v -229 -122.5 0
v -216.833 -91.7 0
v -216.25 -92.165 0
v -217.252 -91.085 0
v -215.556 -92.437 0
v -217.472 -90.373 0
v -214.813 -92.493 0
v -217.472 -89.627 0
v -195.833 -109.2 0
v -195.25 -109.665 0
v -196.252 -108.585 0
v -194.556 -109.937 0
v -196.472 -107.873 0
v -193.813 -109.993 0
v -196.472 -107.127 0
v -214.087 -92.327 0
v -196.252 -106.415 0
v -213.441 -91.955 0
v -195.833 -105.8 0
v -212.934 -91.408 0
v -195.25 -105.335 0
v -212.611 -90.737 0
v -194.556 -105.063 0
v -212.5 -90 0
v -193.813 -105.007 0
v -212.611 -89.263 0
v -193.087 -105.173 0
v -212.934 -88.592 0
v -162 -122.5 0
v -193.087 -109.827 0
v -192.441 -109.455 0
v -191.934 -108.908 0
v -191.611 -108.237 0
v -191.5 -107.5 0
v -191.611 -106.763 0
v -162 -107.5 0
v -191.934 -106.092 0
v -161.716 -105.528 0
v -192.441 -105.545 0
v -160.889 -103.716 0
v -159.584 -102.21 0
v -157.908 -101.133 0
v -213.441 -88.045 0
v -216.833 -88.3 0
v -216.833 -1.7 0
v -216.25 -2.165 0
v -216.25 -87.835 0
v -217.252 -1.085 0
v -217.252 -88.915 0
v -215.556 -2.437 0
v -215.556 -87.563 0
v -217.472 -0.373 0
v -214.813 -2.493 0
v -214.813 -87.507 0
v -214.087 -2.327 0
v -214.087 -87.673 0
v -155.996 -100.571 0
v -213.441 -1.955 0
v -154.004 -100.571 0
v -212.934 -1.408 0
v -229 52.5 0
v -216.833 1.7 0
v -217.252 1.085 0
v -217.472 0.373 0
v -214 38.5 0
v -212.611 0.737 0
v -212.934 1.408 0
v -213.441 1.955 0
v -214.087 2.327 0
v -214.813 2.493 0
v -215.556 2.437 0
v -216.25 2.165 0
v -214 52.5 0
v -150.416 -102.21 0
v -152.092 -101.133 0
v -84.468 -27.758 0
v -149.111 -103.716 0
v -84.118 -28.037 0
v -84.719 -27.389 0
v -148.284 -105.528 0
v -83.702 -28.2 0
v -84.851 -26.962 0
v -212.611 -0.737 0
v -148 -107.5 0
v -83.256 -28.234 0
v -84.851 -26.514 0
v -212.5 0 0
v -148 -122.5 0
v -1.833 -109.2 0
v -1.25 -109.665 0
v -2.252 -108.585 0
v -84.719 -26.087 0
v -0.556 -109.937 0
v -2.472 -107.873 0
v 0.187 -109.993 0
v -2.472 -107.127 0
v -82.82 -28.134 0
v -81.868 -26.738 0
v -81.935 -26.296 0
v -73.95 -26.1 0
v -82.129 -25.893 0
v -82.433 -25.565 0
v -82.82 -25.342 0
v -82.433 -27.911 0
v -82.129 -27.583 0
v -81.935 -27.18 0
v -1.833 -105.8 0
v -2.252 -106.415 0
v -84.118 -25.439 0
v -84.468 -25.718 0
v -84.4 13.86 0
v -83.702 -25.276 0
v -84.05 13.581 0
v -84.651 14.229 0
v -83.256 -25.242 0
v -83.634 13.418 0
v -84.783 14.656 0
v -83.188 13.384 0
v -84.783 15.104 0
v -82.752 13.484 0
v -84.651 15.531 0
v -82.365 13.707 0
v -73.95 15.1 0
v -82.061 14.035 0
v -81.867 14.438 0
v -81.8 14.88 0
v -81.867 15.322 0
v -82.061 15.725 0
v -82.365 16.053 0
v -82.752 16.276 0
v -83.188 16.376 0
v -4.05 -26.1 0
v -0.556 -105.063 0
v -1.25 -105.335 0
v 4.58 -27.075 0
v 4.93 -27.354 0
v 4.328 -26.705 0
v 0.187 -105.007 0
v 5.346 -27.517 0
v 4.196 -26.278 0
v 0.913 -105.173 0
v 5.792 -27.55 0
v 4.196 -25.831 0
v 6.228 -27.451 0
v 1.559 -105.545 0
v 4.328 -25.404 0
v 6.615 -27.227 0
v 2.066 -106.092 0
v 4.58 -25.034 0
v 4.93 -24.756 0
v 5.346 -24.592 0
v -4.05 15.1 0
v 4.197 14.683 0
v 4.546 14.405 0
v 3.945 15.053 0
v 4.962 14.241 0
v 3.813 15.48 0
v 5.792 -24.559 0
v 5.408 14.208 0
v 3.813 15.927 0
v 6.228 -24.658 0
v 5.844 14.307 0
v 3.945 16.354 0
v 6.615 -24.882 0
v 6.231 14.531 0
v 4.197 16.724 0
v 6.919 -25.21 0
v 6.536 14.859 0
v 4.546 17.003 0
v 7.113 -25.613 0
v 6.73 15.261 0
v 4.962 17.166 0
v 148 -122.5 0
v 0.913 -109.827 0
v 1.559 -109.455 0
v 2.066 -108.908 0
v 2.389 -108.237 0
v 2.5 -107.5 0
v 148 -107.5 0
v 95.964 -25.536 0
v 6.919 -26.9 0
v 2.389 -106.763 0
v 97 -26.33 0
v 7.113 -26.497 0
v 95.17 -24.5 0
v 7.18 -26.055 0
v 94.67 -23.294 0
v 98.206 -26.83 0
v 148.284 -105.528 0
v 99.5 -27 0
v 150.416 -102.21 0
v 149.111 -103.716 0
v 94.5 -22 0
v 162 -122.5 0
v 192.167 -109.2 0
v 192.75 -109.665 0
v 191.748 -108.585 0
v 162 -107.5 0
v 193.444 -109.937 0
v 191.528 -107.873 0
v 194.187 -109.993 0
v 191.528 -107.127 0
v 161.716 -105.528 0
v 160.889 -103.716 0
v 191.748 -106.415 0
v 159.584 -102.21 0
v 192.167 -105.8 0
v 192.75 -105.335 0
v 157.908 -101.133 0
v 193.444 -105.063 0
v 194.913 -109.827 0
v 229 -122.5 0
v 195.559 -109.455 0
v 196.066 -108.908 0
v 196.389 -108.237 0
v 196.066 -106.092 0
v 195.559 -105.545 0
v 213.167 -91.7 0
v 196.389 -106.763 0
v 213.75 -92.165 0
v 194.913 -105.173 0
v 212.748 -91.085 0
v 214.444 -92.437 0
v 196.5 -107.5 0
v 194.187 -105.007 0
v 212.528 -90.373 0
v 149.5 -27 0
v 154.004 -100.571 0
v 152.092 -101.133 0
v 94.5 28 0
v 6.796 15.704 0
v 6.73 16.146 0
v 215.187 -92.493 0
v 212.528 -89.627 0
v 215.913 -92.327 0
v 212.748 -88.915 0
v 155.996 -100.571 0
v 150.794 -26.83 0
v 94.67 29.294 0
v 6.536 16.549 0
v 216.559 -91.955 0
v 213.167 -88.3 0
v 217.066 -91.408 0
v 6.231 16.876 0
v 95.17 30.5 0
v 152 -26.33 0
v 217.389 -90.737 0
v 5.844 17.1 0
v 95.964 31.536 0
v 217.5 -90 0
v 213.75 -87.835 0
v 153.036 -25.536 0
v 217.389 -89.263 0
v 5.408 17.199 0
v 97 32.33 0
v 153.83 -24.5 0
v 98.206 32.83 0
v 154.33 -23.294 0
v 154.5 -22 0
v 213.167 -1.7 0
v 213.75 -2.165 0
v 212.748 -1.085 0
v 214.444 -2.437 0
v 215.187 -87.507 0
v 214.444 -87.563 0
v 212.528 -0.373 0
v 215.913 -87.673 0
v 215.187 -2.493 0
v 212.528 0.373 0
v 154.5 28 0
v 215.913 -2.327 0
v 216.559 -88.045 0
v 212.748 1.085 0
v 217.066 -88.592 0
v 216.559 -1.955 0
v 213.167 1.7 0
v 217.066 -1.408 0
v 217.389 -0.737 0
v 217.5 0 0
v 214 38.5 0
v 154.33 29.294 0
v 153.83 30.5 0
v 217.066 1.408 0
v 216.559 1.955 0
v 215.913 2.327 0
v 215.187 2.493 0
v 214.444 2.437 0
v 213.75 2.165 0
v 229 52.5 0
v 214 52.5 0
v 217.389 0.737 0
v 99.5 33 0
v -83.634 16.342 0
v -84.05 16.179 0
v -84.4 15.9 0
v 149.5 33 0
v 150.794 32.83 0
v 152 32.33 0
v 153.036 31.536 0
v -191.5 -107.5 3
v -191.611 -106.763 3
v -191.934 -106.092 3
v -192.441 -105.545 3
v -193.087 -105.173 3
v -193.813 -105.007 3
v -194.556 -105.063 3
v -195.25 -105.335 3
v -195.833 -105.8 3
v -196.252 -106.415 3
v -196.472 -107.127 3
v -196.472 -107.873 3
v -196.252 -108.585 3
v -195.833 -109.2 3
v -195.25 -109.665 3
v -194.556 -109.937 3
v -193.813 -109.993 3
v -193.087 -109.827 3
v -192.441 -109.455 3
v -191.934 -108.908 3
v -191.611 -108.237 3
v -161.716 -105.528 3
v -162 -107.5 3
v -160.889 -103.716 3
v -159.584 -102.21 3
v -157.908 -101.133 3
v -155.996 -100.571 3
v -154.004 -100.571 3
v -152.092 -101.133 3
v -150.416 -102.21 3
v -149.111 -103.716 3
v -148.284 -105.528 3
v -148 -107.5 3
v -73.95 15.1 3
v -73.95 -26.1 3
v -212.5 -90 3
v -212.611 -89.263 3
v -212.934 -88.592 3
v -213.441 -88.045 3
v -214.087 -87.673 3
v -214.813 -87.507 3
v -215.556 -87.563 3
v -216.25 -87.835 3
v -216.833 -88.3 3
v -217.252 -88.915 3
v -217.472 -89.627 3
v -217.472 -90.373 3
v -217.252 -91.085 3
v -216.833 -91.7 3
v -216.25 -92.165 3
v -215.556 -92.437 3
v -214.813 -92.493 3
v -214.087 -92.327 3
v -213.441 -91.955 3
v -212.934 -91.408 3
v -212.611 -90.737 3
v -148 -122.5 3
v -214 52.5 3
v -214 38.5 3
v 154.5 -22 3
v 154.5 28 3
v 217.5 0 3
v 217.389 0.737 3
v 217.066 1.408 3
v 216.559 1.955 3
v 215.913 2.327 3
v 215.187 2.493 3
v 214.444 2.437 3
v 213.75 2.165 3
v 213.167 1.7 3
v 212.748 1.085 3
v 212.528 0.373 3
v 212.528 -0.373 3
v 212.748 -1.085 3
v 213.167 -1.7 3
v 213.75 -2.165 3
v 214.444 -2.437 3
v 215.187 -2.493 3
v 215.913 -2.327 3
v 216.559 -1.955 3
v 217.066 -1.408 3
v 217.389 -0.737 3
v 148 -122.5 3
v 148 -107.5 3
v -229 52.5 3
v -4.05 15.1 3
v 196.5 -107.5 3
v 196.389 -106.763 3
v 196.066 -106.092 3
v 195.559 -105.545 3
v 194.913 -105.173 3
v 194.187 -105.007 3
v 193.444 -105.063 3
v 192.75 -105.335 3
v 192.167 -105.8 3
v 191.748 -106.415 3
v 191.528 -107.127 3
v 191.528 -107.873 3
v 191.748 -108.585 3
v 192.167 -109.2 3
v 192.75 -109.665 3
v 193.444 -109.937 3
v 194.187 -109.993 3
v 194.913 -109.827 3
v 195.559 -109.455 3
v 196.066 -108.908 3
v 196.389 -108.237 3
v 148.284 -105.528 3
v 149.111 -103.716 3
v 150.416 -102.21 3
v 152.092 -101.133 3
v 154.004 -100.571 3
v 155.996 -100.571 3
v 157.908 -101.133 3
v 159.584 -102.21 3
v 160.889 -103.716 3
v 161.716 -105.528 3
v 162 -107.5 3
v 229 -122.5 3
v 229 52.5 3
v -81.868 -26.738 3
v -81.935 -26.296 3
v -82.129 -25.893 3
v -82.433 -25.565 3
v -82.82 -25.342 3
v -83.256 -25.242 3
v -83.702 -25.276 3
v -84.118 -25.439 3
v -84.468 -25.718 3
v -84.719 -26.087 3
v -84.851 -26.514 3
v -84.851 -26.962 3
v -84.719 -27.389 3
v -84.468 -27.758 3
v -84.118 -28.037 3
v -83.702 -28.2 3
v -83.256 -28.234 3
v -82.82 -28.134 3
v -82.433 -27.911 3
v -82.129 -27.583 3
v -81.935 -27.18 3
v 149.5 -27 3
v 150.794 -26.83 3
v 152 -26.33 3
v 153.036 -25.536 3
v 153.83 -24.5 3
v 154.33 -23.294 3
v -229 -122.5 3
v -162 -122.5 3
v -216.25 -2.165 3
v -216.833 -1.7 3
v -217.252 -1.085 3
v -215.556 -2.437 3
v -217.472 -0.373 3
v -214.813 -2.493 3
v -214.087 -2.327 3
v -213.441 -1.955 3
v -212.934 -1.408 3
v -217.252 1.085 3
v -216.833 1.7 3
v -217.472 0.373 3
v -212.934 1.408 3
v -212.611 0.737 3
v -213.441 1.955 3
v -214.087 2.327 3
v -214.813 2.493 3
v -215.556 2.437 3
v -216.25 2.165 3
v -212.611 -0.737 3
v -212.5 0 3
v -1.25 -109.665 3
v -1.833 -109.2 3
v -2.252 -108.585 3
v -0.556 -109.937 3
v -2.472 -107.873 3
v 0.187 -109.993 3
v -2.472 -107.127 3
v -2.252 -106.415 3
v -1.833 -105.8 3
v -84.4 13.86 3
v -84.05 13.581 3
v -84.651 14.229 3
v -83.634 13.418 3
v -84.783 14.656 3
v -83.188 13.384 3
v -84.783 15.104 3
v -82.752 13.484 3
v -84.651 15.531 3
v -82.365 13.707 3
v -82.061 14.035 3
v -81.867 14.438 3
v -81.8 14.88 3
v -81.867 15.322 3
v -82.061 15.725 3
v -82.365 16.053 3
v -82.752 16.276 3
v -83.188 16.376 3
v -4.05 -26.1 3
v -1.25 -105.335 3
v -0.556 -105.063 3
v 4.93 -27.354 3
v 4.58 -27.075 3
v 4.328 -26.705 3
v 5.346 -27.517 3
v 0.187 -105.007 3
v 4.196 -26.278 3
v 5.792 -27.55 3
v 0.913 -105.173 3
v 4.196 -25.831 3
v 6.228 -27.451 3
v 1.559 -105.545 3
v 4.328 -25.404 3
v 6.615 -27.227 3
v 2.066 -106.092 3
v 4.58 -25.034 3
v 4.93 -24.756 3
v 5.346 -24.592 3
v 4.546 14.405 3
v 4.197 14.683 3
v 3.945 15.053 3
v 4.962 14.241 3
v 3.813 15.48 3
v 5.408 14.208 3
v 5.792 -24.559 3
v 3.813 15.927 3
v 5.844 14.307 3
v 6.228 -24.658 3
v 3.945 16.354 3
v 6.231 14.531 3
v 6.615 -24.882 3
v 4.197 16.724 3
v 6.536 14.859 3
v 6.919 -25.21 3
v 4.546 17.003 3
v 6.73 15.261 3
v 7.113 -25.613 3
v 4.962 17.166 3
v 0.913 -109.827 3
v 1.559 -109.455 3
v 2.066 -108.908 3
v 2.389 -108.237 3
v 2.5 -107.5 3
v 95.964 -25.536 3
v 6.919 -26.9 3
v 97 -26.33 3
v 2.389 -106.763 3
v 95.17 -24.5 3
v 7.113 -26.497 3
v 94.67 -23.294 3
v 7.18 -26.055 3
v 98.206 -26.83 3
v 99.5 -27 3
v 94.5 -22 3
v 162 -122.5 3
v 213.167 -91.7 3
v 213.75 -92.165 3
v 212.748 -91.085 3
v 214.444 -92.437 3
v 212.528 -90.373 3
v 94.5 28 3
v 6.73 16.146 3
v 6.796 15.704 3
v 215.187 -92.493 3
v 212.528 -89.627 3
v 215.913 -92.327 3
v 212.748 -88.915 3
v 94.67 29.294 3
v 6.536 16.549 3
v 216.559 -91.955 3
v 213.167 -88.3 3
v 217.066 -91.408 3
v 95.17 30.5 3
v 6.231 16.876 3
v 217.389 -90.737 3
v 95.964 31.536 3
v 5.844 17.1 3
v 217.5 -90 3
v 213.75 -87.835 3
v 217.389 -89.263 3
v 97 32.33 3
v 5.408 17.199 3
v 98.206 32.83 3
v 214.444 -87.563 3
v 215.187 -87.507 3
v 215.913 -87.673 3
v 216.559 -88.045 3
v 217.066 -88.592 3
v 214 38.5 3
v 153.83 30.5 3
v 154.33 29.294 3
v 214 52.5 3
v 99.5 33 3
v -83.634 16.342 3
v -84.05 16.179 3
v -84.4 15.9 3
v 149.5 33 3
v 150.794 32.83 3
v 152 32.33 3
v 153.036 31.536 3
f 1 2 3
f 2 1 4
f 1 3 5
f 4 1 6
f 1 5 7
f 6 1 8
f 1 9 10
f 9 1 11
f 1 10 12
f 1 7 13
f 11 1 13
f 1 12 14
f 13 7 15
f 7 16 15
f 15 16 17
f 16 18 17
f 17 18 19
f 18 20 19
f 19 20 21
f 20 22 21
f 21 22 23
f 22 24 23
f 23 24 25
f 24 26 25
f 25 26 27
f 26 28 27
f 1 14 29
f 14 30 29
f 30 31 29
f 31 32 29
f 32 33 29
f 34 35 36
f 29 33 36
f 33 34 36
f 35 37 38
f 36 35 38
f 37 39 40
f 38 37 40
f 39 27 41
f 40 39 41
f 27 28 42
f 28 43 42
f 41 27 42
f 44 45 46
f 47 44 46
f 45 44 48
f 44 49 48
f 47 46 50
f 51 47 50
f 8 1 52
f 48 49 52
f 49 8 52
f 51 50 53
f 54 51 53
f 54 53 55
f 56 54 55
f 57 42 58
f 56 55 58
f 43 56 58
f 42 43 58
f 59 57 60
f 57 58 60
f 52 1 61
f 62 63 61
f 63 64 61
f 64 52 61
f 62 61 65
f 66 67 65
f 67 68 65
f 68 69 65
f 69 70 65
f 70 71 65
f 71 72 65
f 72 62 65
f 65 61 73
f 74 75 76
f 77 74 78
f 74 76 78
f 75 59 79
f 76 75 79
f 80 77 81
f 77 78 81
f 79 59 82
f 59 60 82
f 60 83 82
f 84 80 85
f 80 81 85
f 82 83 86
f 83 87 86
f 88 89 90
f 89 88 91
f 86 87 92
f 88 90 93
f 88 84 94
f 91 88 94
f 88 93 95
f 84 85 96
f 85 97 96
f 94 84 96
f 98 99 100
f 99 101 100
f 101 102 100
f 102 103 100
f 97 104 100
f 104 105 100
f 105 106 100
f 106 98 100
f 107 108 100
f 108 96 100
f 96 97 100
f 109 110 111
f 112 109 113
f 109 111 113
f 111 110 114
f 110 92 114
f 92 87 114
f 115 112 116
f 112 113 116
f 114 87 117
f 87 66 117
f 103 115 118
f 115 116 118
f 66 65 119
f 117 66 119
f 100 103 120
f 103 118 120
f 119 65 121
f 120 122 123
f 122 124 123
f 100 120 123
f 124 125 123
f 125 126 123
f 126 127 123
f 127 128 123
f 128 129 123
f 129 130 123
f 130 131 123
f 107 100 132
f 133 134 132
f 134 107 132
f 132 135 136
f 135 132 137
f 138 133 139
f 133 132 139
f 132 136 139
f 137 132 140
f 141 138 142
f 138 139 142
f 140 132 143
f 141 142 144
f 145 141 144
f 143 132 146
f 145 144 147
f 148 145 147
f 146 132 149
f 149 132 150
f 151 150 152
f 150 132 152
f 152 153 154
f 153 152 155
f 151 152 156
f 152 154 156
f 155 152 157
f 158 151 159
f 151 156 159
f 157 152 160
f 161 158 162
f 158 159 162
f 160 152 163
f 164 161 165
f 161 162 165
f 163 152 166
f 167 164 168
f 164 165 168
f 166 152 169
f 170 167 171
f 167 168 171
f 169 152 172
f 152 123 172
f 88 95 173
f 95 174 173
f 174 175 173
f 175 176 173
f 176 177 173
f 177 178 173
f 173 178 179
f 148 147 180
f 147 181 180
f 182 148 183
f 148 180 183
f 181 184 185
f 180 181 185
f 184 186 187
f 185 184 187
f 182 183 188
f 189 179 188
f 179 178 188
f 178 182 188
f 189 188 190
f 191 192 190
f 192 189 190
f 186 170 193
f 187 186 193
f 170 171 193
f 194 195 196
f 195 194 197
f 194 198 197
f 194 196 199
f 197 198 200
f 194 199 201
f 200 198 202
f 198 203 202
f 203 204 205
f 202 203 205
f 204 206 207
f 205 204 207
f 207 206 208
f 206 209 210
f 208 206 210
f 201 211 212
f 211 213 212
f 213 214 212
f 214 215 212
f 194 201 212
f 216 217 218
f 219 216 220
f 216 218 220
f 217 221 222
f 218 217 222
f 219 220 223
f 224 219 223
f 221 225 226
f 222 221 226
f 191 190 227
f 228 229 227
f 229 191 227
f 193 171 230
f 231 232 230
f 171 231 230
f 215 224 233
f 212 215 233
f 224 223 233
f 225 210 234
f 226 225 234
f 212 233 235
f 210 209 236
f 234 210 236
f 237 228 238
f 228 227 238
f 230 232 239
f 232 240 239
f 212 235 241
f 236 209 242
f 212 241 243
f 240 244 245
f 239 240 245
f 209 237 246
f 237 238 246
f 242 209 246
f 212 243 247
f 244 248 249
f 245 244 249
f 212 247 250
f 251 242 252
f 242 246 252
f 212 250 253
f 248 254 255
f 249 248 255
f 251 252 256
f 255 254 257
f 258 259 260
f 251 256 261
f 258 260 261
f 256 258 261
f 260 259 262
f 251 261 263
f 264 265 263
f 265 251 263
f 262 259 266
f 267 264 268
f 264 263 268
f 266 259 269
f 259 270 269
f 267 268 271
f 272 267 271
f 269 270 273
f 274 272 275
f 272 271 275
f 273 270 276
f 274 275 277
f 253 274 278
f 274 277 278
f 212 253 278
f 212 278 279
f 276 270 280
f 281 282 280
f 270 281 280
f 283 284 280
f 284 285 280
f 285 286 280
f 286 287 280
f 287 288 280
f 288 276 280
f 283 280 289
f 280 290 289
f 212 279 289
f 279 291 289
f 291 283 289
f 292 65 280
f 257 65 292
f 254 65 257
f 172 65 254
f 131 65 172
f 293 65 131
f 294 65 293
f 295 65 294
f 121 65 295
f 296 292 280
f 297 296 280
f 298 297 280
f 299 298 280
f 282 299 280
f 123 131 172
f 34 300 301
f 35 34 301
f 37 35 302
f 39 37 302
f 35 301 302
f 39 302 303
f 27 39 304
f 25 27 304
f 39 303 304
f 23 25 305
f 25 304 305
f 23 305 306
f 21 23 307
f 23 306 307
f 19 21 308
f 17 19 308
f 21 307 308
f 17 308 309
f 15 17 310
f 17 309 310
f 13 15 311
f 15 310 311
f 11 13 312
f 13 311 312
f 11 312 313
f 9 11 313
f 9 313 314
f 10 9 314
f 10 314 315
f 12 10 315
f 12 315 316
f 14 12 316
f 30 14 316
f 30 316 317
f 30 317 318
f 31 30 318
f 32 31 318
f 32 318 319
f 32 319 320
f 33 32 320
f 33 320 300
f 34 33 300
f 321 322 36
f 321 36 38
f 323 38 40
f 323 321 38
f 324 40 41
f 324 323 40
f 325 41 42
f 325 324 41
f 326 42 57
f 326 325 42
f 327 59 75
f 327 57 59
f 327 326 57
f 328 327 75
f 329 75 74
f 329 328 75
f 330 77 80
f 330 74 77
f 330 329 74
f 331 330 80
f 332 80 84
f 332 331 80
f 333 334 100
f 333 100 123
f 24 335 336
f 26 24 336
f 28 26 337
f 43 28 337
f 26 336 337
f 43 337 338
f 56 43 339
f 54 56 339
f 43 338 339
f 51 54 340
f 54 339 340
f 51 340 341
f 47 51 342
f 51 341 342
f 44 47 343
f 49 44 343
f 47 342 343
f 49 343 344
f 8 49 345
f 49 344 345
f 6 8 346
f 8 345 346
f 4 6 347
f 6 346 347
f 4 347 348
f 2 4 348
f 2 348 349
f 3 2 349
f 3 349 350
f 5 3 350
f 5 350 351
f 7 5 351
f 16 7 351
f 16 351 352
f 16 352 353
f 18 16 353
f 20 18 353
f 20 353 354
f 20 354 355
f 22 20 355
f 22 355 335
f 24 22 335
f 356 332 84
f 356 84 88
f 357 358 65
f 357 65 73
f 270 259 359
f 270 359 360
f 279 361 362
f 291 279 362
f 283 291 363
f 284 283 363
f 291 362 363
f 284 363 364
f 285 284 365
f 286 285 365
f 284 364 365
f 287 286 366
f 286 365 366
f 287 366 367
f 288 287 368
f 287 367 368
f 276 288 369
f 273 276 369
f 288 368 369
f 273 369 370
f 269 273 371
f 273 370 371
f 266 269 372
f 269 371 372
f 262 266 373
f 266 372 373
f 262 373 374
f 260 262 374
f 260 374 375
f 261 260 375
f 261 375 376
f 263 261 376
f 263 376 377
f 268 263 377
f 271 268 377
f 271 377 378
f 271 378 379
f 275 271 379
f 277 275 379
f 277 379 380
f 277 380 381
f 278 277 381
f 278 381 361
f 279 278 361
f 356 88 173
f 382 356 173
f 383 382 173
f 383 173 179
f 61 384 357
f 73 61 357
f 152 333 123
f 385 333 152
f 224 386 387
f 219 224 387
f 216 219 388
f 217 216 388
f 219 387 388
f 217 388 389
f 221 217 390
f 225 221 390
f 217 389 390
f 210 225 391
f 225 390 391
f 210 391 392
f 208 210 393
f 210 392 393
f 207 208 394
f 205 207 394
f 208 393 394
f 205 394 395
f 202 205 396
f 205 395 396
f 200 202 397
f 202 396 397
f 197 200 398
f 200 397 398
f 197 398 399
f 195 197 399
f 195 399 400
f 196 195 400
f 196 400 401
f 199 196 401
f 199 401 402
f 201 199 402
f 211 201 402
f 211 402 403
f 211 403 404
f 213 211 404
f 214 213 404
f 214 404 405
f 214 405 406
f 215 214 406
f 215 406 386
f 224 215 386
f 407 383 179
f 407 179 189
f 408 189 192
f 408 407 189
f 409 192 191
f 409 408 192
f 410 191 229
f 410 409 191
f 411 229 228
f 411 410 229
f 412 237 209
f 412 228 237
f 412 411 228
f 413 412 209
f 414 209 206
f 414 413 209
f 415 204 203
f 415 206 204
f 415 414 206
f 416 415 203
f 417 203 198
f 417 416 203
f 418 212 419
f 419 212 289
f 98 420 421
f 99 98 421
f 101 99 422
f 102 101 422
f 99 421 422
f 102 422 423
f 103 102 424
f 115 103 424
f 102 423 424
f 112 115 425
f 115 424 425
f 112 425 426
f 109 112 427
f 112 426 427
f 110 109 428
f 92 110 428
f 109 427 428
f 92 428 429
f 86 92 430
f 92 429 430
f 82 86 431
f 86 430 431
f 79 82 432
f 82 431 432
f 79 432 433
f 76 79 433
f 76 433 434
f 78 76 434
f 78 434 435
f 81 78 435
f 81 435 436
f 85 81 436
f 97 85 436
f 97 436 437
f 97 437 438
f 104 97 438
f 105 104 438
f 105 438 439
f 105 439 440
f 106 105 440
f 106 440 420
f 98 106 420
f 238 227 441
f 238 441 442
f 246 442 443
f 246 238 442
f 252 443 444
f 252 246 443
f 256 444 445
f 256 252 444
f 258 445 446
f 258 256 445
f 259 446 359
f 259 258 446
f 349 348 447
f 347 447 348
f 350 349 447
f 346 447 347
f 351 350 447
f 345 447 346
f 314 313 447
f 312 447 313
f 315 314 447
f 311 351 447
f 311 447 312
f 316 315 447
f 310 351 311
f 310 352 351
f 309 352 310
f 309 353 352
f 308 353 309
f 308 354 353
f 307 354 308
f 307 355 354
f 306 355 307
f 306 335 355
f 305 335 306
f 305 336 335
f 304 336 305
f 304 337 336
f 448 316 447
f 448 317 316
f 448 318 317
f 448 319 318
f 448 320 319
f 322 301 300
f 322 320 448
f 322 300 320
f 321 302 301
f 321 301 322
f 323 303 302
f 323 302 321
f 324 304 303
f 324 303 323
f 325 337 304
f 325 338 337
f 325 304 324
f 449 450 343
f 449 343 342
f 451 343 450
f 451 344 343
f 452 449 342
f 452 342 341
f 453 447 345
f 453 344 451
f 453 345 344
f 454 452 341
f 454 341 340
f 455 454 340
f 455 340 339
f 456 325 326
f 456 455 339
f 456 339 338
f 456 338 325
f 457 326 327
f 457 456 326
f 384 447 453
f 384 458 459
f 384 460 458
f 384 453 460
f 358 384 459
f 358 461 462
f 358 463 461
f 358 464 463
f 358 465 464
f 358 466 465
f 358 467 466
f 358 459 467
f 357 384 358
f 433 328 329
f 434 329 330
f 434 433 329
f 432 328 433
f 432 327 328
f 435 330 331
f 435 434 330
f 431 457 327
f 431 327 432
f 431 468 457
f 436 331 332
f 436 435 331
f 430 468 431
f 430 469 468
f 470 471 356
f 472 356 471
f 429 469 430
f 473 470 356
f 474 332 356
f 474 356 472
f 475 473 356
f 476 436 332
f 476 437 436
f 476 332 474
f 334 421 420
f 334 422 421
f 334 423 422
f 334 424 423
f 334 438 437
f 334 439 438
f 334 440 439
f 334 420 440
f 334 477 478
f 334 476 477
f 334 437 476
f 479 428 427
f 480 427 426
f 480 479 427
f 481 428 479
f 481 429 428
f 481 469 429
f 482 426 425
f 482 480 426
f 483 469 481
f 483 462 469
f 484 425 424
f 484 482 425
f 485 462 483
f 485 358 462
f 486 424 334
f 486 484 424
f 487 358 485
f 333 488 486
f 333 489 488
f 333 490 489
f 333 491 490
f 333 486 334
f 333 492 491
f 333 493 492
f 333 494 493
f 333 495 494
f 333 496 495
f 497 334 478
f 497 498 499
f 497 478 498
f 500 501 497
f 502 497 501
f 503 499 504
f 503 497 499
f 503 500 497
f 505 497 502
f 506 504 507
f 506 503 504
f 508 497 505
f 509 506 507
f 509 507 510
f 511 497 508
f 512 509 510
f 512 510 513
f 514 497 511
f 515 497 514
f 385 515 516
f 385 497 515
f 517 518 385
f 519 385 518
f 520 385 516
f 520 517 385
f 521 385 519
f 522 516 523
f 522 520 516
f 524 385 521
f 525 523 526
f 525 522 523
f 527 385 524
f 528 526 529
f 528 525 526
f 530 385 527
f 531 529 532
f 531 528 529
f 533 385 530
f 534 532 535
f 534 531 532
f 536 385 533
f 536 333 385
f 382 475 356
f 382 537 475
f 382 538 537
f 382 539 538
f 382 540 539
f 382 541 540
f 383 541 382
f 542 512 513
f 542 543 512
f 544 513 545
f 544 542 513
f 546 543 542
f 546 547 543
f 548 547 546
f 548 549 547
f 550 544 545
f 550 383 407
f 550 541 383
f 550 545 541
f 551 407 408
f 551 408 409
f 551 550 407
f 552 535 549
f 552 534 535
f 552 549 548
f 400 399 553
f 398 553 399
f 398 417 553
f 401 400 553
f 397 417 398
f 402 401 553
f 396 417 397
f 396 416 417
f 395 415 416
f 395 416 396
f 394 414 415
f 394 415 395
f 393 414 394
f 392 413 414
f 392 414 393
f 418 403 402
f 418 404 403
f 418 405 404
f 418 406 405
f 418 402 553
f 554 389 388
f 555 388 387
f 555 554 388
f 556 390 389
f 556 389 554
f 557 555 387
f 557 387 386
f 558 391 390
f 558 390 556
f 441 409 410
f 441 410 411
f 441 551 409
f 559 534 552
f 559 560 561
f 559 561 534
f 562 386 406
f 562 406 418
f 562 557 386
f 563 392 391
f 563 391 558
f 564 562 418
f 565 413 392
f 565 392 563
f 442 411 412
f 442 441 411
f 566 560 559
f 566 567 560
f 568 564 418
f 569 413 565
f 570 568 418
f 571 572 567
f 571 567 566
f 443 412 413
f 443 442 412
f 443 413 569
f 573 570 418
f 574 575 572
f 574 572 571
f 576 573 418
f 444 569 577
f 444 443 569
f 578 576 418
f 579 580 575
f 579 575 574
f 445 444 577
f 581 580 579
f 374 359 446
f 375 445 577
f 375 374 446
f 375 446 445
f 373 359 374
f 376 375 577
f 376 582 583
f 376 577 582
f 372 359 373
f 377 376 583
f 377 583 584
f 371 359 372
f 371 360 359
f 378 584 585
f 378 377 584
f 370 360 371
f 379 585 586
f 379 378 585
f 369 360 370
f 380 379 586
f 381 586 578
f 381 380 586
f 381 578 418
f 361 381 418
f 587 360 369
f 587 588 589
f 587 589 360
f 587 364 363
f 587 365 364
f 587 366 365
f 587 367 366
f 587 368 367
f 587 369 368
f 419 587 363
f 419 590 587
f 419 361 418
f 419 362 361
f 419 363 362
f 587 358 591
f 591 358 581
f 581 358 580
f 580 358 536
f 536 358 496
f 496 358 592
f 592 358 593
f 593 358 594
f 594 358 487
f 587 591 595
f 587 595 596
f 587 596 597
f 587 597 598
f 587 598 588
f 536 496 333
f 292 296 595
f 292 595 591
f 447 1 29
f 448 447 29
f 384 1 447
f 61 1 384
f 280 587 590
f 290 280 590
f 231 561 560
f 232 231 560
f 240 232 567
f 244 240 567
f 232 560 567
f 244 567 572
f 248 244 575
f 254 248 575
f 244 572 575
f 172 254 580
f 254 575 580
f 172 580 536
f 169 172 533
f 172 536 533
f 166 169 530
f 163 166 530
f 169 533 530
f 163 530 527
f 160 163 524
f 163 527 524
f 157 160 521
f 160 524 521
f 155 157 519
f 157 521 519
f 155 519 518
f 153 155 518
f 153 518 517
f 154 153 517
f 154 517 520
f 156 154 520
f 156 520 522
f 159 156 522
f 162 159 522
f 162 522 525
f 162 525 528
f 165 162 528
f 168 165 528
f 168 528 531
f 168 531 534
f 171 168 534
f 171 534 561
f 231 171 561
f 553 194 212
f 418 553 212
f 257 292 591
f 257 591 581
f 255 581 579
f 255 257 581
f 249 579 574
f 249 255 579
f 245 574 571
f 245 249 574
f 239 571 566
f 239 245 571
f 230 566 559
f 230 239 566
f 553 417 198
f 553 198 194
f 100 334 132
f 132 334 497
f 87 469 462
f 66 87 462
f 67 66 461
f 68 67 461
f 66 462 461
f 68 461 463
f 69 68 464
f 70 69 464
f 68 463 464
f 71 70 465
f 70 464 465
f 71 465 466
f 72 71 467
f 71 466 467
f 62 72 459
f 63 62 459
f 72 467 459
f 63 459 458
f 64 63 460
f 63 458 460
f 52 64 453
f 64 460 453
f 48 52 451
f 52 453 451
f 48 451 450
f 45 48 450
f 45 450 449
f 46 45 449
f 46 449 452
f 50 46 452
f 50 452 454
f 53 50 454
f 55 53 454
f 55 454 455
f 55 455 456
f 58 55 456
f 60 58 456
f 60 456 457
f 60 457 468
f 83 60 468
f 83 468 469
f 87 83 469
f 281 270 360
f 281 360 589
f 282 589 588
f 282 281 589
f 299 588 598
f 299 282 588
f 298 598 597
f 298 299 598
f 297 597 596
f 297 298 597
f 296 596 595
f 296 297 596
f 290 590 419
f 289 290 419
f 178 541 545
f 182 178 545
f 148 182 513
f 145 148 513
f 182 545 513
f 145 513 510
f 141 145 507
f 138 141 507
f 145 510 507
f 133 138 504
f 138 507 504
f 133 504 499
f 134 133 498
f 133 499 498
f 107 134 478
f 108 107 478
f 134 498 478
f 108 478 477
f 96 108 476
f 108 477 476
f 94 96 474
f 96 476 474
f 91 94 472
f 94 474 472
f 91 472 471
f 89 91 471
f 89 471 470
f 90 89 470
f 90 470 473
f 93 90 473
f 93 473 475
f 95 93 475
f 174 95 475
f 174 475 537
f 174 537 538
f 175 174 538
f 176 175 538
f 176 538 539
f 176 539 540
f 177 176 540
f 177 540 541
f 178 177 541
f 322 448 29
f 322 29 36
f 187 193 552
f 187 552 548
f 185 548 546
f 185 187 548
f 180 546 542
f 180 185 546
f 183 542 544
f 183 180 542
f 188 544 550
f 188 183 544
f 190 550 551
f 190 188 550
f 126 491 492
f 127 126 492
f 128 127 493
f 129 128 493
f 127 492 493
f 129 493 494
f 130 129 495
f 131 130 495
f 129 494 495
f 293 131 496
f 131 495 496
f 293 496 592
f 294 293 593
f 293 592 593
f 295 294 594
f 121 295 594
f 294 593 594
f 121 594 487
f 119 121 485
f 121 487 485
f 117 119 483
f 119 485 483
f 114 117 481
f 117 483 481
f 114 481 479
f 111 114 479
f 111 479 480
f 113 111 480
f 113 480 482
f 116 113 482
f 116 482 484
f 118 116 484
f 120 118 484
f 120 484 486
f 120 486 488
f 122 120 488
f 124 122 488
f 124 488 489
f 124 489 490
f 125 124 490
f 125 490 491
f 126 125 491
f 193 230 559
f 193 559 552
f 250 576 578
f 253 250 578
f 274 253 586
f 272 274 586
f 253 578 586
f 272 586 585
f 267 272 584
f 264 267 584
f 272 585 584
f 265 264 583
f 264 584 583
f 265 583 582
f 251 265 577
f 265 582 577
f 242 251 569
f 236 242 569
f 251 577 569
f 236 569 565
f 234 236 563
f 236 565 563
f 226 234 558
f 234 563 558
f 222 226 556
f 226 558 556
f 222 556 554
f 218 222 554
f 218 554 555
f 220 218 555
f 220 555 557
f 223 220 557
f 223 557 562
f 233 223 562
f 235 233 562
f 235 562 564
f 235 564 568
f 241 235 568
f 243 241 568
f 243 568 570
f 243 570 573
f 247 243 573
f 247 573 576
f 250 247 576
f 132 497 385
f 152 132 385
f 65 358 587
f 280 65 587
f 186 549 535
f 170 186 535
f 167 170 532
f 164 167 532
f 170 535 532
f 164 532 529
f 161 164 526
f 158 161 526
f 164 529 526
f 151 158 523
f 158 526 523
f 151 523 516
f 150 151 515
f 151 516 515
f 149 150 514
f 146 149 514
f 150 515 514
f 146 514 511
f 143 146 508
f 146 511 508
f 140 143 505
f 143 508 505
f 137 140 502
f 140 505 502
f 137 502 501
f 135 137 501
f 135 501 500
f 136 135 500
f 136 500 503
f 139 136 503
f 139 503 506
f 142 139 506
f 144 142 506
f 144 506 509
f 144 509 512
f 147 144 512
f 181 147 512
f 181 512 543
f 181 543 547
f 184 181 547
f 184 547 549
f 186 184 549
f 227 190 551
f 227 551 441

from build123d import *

# Parameters (mm, degrees)
SKETCH1_W                         = 458
SKETCH1_H                         = 245
BOSS_EXTRUDE1_DEPTH               = 3
CUT_EXTRUDE1_DEPTH                = 260.723410574
SKETCH3_R                         = 2.5
CUT_EXTRUDE2_DEPTH                = 260.723410574
SKETCH4_R                         = 11.5
CUT_EXTRUDE3_DEPTH                = 260.723410574
SKETCH5_W                         = 428
SKETCH5_H                         = 29
CUT_EXTRUDE4_DEPTH                = 260.723410574
SKETCH8_R                         = 1.5
SKETCH8_W                         = 69.9
SKETCH8_H                         = 41.2
CUT_EXTRUDE5_DEPTH                = 260.723410574
SKETCH9_W                         = 458
SKETCH9_H                         = 70
CUT_EXTRUDE6_DEPTH                = 10
CUT_SWITCHRUBBER_60X60_DEPTH      = 260.723410574
CUT_SWITCHRUBBER_60X60_DEPTH_BACK = 260.723410574


with BuildPart() as part:
    # Sketch1 → Boss-Extrude1 (new body)
    with BuildSketch(Plane.XY):
        Rectangle(SKETCH1_W, SKETCH1_H)
    extrude(amount=BOSS_EXTRUDE1_DEPTH)

    # Sketch2 → Cut-Extrude1 (cut, through all)
    with BuildSketch(Plane.XY.offset(3)):
        with BuildLine():
            Line((-148, -107.5), (-148, -122.5))
            ThreePointArc((-148, -122.5), (-155, -129.5), (-162, -122.5))
            Line((-162, -122.5), (-162, -107.5))
            ThreePointArc((-162, -107.5), (-155, -100.5), (-148, -107.5))
        make_face()
        with BuildLine():
            Line((162, -107.5), (162, -122.5))
            ThreePointArc((162, -122.5), (155, -129.5), (148, -122.5))
            Line((148, -122.5), (148, -107.5))
            ThreePointArc((148, -107.5), (155, -100.5), (162, -107.5))
        make_face()
    extrude(amount=-CUT_EXTRUDE1_DEPTH, mode=Mode.SUBTRACT)

    # Sketch3 → Cut-Extrude2 (cut, through all)
    with BuildSketch(Plane.XY.offset(3)):
        with Locations((-194, 112.5)):
            Circle(SKETCH3_R)
        with Locations((-194, -107.5)):
            Circle(SKETCH3_R)
        with Locations((194, -107.5)):
            Circle(SKETCH3_R)
        with Locations((194, 112.5)):
            Circle(SKETCH3_R)
        with Locations((-215, 0)):
            Circle(SKETCH3_R)
        with Locations((-215, -90)):
            Circle(SKETCH3_R)
        with Locations((-215, 90)):
            Circle(SKETCH3_R)
        with Locations((215, 0)):
            Circle(SKETCH3_R)
        with Locations((215, -90)):
            Circle(SKETCH3_R)
        with Locations((215, 90)):
            Circle(SKETCH3_R)
        with Locations((0, 112.5)):
            Circle(SKETCH3_R)
        with Locations((0, -107.5)):
            Circle(SKETCH3_R)
    extrude(amount=-CUT_EXTRUDE2_DEPTH, mode=Mode.SUBTRACT)

    # Sketch4 → Cut-Extrude3 (cut, through all)
    with BuildSketch(Plane.XY.offset(3)):
        with Locations((-39, 91)):
            Circle(SKETCH4_R)
        with Locations((39, 91)):
            Circle(SKETCH4_R)
    extrude(amount=-CUT_EXTRUDE3_DEPTH, mode=Mode.SUBTRACT)

    # Sketch5 → Cut-Extrude4 (cut, through all)
    with BuildSketch(Plane.XY.offset(3)):
        with Locations((0, 53)):
            Rectangle(SKETCH5_W, SKETCH5_H)
    extrude(amount=-CUT_EXTRUDE4_DEPTH, mode=Mode.SUBTRACT)

    # Sketch8 → Cut-Extrude5 (cut, through all)
    with BuildSketch(Plane.XY.offset(3)):
        with Locations((5.296172264, 15.703565509)):
            Circle(SKETCH8_R)
        with Locations((5.679687501, -26.054673392)):
            Circle(SKETCH8_R)
        with Locations((-83.3, 14.88)):
            Circle(SKETCH8_R)
        with Locations((-83.367997673, -26.737946691)):
            Circle(SKETCH8_R)
        with Locations((-39, -5.5)):
            Rectangle(SKETCH8_W, SKETCH8_H)
    extrude(amount=-CUT_EXTRUDE5_DEPTH, mode=Mode.SUBTRACT)

    # Sketch9 → Cut-Extrude6 (cut)
    with BuildSketch(Plane.XY.offset(3)):
        with Locations((0, 87.5)):
            Rectangle(SKETCH9_W, SKETCH9_H)
    extrude(amount=-CUT_EXTRUDE6_DEPTH, mode=Mode.SUBTRACT)

    # Sketch11 → Cut_SwitchRubber_60x60 (cut, two sides: drawn at the far end of the back side and taken through both)
    with BuildSketch(Plane.XY.offset(-CUT_SWITCHRUBBER_60X60_DEPTH_BACK)):
        with BuildLine():
            Line((99.5, -27), (149.5, -27))
            ThreePointArc((149.5, -27), (153.035533906, -25.535533906), (154.5, -22))
            Line((154.5, -22), (154.5, 28))
            ThreePointArc((154.5, 28), (153.035533906, 31.535533906), (149.5, 33))
            Line((149.5, 33), (99.5, 33))
            ThreePointArc((99.5, 33), (95.964466094, 31.535533906), (94.5, 28))
            Line((94.5, 28), (94.5, -22))
            ThreePointArc((94.5, -22), (95.964466094, -25.535533906), (99.5, -27))
        make_face()
    extrude(amount=CUT_SWITCHRUBBER_60X60_DEPTH + CUT_SWITCHRUBBER_60X60_DEPTH_BACK, mode=Mode.SUBTRACT)


solid = part.part
